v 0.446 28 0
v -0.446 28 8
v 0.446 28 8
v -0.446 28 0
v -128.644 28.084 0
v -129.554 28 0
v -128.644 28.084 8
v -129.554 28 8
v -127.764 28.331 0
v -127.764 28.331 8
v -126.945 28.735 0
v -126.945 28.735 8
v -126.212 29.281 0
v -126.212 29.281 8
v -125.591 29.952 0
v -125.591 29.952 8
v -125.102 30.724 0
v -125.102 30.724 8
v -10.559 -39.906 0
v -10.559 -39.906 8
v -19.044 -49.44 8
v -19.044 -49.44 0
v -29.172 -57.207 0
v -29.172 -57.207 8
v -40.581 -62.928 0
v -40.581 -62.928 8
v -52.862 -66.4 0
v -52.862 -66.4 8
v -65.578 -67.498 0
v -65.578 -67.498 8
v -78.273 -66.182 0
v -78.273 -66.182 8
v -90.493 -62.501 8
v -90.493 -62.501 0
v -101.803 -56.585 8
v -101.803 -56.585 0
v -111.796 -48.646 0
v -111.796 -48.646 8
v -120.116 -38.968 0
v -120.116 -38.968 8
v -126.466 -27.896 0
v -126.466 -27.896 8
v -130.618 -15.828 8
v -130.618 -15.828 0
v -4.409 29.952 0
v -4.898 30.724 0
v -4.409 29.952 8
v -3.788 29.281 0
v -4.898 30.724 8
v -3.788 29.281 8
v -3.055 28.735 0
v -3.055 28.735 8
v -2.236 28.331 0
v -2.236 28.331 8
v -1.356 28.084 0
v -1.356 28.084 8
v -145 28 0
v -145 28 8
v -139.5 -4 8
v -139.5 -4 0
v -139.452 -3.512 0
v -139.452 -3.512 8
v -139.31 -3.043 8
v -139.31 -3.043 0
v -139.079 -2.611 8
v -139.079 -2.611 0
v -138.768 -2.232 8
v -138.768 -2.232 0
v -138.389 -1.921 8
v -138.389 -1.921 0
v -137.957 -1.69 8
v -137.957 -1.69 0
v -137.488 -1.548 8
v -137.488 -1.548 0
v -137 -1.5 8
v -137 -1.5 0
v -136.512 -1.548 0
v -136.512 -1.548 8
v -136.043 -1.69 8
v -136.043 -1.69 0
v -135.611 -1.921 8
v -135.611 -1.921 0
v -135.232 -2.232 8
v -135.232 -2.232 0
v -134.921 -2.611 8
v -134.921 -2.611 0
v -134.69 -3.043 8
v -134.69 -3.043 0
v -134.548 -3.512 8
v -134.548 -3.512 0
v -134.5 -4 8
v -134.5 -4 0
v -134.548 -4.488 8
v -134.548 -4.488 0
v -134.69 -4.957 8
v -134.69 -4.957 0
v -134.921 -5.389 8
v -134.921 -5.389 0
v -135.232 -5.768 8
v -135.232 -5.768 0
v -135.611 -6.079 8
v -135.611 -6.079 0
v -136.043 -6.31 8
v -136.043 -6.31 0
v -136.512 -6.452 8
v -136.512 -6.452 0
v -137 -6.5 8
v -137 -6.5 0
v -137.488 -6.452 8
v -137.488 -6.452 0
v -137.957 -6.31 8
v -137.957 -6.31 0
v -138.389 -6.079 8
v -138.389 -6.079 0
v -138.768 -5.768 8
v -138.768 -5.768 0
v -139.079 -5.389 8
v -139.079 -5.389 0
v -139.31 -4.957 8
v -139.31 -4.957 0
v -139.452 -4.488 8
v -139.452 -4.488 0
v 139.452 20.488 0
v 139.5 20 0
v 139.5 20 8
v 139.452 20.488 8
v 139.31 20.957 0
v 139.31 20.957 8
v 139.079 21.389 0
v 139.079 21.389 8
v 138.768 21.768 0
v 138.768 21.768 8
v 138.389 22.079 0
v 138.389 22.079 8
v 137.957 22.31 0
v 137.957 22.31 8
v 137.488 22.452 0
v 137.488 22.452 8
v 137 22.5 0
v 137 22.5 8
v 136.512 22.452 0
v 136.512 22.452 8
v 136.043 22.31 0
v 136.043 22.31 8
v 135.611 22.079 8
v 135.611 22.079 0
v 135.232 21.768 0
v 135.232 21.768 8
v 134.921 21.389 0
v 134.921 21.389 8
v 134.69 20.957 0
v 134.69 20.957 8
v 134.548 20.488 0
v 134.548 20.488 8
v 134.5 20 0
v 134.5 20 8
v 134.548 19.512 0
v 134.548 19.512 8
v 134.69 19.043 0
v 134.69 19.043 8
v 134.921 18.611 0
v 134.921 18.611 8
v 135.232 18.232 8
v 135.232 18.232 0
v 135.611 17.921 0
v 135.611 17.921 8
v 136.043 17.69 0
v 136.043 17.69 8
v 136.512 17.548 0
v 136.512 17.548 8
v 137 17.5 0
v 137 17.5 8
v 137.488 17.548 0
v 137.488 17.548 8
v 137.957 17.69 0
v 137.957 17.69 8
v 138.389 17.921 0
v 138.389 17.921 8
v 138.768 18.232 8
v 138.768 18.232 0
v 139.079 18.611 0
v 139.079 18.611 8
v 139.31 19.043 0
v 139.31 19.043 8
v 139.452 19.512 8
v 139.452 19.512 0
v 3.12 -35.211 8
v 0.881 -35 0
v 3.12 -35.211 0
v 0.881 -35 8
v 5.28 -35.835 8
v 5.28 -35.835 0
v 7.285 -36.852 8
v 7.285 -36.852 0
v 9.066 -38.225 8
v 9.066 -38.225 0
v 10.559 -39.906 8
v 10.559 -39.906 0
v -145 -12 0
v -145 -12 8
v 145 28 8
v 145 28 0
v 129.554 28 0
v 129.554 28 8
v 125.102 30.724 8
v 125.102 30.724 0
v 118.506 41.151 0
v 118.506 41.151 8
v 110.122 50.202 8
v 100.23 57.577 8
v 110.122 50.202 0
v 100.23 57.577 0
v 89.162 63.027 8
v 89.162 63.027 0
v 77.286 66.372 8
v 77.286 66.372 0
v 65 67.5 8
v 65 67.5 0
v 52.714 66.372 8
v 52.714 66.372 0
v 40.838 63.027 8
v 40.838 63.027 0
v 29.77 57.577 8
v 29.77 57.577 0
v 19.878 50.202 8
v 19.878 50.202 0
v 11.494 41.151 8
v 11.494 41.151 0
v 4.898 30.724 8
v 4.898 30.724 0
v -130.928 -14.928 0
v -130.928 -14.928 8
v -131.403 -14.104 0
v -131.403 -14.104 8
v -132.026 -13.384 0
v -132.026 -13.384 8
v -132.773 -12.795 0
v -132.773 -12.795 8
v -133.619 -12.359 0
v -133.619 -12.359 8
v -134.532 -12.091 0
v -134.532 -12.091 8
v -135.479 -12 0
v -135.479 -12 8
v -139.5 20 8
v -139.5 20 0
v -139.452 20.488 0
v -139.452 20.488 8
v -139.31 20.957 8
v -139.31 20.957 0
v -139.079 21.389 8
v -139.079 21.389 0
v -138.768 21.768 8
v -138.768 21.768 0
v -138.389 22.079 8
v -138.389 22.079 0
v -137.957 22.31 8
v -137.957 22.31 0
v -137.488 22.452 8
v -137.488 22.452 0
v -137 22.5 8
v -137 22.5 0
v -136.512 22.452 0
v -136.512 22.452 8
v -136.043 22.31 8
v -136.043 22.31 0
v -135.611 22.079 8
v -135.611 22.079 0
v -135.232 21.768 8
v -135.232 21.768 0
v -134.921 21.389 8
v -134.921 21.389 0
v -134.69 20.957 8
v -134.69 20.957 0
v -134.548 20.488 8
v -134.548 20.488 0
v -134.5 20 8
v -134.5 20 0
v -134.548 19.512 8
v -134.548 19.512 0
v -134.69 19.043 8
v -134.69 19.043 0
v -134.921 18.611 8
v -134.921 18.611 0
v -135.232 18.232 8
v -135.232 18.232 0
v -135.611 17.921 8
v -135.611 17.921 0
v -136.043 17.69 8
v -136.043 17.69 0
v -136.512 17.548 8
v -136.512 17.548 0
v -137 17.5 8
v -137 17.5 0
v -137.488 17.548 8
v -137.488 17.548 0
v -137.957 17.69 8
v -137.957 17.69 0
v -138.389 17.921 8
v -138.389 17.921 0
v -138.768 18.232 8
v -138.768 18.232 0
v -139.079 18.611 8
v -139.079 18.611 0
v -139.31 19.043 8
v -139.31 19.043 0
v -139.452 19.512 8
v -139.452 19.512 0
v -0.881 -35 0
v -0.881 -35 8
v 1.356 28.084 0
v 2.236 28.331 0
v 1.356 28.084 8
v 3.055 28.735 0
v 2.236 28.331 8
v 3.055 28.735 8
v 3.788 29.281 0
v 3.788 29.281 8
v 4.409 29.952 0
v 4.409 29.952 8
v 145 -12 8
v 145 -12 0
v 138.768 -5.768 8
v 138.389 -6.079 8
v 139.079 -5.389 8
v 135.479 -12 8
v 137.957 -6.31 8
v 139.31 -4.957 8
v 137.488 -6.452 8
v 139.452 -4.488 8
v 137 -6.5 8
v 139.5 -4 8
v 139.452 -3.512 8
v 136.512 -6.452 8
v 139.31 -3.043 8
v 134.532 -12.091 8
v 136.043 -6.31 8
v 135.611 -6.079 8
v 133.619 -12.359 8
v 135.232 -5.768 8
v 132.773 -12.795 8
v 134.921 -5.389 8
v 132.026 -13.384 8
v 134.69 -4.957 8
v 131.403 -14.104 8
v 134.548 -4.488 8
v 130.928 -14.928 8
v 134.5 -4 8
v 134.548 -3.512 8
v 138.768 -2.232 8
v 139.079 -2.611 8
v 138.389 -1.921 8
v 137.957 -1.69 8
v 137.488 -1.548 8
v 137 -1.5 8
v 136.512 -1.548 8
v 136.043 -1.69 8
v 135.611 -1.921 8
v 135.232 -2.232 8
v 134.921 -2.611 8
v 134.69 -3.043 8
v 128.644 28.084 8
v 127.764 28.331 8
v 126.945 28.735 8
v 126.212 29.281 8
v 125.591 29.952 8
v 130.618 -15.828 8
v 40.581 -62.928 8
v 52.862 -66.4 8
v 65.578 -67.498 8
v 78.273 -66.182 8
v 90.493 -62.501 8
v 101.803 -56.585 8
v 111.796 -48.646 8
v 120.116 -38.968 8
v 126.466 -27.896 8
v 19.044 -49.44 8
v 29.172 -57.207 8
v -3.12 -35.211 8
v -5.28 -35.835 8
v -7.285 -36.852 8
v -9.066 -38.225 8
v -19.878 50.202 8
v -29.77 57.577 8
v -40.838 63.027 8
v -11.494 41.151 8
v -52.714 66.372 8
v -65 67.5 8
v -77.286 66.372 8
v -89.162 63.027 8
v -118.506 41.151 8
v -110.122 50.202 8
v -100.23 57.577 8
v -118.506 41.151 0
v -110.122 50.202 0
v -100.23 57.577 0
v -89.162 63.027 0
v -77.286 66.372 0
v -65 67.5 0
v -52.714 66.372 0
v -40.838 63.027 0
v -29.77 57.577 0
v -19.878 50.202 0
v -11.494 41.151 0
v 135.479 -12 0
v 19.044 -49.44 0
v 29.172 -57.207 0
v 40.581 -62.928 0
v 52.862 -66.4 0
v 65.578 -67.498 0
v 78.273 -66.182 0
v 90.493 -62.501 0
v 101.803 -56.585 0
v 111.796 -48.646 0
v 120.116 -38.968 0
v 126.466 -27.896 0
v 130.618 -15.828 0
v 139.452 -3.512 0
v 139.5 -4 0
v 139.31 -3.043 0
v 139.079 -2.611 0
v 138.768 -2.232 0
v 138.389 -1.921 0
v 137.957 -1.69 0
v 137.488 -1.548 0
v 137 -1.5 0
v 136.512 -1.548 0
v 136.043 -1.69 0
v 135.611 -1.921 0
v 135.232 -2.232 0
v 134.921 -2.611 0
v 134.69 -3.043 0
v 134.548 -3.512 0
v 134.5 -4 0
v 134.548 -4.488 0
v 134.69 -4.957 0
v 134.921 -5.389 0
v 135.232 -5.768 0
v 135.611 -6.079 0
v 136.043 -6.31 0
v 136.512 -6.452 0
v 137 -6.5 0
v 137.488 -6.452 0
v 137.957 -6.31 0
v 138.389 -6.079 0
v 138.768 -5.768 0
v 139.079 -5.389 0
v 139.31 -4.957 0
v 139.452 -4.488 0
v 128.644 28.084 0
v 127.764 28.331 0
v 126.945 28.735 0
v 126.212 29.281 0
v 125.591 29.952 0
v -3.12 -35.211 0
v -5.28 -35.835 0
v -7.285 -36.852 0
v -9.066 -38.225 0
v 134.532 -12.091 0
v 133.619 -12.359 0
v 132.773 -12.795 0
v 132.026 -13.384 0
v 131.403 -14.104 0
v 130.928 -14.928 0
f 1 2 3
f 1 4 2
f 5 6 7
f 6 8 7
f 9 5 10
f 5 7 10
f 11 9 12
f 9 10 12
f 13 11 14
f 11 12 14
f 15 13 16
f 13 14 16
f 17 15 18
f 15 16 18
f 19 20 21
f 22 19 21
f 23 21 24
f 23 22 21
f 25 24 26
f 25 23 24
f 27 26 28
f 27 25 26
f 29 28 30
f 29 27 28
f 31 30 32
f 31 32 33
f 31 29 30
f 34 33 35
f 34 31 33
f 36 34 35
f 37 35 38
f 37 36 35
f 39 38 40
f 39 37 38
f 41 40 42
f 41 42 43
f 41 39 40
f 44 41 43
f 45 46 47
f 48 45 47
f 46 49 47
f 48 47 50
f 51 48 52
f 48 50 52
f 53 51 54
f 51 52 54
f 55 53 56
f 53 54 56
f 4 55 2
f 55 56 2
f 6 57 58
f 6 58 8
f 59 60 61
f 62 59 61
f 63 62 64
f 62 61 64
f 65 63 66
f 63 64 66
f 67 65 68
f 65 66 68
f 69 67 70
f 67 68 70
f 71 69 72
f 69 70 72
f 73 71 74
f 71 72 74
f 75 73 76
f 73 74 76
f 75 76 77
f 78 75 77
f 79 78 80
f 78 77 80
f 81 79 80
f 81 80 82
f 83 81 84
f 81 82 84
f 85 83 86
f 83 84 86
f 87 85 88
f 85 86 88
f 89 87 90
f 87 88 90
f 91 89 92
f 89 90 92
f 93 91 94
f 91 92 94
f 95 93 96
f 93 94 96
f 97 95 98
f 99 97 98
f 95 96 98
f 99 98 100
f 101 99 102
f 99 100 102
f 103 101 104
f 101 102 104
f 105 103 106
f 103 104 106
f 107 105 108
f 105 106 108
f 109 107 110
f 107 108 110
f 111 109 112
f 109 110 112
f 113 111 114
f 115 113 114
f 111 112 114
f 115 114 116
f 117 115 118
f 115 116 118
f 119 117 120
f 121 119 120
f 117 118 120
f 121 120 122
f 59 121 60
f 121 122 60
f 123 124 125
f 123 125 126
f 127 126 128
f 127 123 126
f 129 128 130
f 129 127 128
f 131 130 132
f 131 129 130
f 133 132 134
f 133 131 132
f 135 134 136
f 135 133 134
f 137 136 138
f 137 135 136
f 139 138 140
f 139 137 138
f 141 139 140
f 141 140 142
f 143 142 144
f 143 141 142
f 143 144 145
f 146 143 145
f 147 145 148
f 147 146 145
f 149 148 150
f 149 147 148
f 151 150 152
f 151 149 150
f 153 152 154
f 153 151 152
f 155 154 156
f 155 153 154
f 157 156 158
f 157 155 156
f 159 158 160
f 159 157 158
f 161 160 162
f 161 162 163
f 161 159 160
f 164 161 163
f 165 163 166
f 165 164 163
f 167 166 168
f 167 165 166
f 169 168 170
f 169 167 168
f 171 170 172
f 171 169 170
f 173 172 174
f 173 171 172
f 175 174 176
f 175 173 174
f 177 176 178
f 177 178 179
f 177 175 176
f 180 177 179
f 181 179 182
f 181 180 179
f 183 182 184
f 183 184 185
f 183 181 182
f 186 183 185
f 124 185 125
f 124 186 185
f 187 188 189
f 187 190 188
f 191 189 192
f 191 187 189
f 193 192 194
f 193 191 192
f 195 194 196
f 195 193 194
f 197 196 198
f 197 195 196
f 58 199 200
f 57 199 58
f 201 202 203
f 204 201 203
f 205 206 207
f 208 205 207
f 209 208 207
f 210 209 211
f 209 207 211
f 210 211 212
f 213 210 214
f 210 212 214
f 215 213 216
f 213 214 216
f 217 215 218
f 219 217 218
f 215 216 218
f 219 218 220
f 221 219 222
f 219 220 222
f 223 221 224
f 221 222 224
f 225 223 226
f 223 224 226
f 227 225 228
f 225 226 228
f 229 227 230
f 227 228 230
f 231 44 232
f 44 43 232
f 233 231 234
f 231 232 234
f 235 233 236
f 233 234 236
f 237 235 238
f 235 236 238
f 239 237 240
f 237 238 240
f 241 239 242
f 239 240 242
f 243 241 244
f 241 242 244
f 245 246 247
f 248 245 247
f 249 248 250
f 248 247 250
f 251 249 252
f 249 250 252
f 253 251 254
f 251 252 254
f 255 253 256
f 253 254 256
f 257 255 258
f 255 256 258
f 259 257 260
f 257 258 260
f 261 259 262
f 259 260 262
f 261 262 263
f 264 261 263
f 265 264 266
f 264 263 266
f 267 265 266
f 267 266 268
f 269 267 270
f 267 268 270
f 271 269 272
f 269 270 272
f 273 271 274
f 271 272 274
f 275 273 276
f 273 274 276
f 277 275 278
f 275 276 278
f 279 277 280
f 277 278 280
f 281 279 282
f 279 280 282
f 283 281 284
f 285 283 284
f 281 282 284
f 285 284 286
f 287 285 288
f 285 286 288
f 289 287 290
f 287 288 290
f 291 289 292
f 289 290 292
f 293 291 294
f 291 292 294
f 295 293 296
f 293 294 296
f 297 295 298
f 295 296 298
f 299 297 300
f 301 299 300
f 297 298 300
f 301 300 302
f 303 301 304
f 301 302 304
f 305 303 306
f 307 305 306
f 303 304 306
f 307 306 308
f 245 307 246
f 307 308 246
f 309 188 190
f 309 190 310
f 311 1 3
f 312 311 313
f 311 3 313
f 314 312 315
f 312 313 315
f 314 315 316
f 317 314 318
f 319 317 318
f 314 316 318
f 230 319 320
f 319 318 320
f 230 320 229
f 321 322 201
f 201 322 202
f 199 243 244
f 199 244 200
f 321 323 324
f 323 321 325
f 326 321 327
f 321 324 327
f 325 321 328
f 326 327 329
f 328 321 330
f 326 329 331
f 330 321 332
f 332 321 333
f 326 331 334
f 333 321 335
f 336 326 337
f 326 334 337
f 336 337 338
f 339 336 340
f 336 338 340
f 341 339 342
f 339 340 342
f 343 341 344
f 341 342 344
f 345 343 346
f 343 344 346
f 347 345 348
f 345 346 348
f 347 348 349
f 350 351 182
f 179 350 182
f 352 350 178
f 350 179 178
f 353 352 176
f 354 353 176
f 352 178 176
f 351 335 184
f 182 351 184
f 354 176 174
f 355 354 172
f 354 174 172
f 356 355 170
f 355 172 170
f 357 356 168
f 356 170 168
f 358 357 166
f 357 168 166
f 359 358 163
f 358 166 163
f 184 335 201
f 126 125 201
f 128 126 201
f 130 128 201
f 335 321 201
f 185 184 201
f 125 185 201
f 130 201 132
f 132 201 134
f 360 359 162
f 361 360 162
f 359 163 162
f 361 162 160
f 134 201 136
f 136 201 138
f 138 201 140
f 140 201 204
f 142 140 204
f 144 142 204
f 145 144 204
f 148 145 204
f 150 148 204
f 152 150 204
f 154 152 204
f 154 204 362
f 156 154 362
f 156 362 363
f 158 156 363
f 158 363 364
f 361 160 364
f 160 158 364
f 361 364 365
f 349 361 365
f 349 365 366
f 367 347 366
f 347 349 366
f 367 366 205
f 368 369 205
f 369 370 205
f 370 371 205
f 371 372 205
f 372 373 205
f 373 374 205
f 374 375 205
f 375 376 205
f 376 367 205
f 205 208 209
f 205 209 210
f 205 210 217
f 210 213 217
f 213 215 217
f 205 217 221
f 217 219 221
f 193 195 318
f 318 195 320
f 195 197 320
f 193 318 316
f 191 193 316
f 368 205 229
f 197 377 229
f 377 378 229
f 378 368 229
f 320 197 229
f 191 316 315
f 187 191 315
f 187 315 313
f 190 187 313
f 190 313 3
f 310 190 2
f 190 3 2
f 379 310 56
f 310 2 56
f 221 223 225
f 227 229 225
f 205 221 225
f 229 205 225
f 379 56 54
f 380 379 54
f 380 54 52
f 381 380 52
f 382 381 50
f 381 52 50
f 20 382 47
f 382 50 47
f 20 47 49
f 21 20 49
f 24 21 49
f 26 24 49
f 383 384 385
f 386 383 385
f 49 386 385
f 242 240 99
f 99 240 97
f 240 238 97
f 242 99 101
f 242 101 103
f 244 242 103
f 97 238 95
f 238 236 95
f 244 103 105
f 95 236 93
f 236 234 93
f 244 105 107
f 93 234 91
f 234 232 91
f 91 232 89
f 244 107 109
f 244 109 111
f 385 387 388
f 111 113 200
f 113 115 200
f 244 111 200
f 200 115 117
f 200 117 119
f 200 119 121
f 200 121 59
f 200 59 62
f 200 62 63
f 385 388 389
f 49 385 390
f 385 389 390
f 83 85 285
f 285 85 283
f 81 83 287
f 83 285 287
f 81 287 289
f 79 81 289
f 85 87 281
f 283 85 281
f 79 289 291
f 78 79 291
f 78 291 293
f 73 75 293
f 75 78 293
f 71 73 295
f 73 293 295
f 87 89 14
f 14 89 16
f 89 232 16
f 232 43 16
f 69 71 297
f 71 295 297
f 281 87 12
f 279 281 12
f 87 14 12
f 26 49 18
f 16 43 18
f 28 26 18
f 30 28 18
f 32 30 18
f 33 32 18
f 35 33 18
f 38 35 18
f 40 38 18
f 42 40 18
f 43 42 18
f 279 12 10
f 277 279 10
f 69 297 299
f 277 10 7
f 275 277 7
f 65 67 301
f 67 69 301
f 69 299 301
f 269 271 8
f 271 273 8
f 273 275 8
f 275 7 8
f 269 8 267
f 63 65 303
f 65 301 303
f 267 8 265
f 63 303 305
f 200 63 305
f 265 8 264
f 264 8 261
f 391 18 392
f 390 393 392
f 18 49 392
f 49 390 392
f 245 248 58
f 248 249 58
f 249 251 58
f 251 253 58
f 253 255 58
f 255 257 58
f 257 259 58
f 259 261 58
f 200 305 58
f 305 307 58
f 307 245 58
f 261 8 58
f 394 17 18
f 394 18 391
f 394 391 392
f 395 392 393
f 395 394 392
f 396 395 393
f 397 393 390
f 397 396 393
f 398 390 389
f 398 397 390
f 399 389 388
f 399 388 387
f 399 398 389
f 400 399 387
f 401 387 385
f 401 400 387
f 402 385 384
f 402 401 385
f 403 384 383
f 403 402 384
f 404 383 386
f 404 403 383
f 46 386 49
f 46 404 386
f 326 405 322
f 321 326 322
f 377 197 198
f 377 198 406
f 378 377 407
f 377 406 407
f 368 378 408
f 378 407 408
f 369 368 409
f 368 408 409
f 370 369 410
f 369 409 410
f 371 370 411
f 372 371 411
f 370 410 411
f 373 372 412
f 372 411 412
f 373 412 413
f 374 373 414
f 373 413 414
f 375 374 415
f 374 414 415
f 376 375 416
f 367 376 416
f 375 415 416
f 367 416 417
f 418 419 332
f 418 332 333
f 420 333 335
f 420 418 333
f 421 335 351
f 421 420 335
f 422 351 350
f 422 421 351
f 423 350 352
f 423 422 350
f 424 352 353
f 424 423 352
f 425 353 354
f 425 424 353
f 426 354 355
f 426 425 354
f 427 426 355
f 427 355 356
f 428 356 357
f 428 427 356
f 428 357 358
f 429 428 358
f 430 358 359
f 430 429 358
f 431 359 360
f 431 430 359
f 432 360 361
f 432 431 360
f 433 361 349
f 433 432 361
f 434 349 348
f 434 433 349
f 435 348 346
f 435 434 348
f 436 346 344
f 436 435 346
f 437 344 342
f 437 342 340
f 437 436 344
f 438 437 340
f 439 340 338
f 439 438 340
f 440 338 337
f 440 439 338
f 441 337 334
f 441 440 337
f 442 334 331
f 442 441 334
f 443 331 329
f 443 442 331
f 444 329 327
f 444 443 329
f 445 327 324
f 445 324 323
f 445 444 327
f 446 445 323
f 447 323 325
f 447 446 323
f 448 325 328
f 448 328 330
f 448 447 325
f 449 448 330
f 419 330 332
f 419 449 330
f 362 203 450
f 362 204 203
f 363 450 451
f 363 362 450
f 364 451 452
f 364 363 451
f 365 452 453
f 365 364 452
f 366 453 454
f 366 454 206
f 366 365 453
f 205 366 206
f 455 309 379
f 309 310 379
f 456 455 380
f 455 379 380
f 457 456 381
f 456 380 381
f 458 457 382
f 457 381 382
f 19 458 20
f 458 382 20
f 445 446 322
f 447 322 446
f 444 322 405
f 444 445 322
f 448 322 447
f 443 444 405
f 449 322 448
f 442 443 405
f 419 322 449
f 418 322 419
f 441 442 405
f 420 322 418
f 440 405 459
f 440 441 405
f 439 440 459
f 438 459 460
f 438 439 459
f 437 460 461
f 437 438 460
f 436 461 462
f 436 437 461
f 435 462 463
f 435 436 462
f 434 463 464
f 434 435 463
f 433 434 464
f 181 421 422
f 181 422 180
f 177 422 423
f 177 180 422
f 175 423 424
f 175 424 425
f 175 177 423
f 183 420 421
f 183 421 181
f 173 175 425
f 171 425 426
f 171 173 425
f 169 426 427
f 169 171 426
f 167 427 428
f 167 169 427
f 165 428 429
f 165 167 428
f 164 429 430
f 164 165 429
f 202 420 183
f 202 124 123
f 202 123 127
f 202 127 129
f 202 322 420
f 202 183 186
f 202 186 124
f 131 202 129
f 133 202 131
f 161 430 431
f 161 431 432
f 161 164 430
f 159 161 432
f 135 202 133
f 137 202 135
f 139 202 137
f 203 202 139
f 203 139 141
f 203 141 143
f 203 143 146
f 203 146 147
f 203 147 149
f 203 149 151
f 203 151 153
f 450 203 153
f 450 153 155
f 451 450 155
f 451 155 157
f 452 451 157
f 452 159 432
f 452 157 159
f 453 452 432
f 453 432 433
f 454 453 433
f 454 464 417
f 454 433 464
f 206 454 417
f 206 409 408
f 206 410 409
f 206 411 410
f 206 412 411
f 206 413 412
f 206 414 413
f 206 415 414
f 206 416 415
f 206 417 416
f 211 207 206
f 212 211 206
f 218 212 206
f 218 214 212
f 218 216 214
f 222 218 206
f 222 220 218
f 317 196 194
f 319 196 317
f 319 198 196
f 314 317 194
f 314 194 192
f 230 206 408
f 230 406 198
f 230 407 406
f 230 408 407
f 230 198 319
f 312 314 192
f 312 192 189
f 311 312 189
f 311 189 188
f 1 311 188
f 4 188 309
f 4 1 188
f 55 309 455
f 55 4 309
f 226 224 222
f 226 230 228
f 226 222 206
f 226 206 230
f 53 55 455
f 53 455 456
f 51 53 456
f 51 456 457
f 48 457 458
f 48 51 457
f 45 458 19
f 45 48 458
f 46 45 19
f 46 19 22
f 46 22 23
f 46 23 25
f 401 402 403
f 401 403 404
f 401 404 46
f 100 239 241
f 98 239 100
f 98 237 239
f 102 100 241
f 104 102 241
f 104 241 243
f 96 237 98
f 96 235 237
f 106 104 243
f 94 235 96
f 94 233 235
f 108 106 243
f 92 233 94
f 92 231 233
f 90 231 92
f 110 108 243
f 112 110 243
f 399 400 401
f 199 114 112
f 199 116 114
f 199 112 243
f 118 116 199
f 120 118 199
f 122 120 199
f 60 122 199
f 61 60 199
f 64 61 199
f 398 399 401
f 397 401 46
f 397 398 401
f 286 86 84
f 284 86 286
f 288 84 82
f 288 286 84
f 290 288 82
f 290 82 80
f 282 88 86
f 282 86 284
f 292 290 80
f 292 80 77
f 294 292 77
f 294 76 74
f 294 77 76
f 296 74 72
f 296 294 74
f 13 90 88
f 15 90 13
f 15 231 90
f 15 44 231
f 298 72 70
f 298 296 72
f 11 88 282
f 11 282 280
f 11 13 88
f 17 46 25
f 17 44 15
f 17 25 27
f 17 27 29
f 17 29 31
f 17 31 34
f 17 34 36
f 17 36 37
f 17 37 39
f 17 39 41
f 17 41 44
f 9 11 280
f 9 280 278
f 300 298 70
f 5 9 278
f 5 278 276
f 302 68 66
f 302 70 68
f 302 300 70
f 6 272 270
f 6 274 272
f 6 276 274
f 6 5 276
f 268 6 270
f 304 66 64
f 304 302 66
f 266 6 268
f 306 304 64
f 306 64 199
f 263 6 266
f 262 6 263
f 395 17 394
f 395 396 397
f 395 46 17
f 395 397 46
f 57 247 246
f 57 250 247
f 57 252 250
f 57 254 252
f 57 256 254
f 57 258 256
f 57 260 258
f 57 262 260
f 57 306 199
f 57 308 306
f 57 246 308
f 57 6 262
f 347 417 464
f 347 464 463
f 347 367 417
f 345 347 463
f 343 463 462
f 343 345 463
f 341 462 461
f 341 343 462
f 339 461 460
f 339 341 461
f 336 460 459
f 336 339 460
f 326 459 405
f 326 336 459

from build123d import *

# Parameters (mm, degrees)
F0_R     = 2.5
F1_DEPTH = 8
F3_R     = 12
F4_R     = 5
F5_R     = 5


with BuildPart() as f1:
    # F0 (on Top) → F1 (new body)
    with BuildSketch(Plane.XY):
        with BuildLine():
            Line((0, -35), (7.2830180969, -35))
            ThreePointArc((7.2830180969, -35), (77.2966007948, -66.3705025512), (131.4247694765, -12))
            Line((131.4247694765, -12), (145, -12))
            Line((145, -12), (145, 28))
            Line((145, 28), (126.4186453774, 28))
            ThreePointArc((126.4186453774, 28), (65, 67.5), (3.5813546226, 28))
            Line((3.5813546226, 28), (0, 28))
            Line((0, 28), (0, 0))
            Line((0, 0), (0, -35))
        make_face()
        with Locations((137, -4)):
            Circle(F0_R, mode=Mode.SUBTRACT)
        with Locations((137, 20)):
            Circle(F0_R, mode=Mode.SUBTRACT)
    extrude(amount=F1_DEPTH)

    # F2: F1 across face


with BuildPart() as f1_1:
    add(f1.part)
    add(f1.part.mirror(Plane(origin=(0, -3.5, 4), x_dir=(0, -1, 0), z_dir=(-1, 0, 0))))

    # F3
    f3_edges = [f1_1.edges().sort_by_distance(p)[0] for p in [
        (7.283018, -35, 4),
        (-7.283018, -35, 4),
    ]]
    fillet(f3_edges, radius=F3_R)

    # F4
    f4_edges = [f1_1.edges().sort_by_distance(p)[0] for p in [
        (131.424769, -12, 4),
        (126.418645, 28, 4),
        (-126.418645, 28, 4),
        (-131.424769, -12, 4),
    ]]
    fillet(f4_edges, radius=F4_R)

    # F5
    f5_edges = [f1_1.edges().sort_by_distance(p)[0] for p in [
        (-3.581355, 28, 4),
        (3.581355, 28, 4),
    ]]
    fillet(f5_edges, radius=F5_R)


solid = f1_1.part
